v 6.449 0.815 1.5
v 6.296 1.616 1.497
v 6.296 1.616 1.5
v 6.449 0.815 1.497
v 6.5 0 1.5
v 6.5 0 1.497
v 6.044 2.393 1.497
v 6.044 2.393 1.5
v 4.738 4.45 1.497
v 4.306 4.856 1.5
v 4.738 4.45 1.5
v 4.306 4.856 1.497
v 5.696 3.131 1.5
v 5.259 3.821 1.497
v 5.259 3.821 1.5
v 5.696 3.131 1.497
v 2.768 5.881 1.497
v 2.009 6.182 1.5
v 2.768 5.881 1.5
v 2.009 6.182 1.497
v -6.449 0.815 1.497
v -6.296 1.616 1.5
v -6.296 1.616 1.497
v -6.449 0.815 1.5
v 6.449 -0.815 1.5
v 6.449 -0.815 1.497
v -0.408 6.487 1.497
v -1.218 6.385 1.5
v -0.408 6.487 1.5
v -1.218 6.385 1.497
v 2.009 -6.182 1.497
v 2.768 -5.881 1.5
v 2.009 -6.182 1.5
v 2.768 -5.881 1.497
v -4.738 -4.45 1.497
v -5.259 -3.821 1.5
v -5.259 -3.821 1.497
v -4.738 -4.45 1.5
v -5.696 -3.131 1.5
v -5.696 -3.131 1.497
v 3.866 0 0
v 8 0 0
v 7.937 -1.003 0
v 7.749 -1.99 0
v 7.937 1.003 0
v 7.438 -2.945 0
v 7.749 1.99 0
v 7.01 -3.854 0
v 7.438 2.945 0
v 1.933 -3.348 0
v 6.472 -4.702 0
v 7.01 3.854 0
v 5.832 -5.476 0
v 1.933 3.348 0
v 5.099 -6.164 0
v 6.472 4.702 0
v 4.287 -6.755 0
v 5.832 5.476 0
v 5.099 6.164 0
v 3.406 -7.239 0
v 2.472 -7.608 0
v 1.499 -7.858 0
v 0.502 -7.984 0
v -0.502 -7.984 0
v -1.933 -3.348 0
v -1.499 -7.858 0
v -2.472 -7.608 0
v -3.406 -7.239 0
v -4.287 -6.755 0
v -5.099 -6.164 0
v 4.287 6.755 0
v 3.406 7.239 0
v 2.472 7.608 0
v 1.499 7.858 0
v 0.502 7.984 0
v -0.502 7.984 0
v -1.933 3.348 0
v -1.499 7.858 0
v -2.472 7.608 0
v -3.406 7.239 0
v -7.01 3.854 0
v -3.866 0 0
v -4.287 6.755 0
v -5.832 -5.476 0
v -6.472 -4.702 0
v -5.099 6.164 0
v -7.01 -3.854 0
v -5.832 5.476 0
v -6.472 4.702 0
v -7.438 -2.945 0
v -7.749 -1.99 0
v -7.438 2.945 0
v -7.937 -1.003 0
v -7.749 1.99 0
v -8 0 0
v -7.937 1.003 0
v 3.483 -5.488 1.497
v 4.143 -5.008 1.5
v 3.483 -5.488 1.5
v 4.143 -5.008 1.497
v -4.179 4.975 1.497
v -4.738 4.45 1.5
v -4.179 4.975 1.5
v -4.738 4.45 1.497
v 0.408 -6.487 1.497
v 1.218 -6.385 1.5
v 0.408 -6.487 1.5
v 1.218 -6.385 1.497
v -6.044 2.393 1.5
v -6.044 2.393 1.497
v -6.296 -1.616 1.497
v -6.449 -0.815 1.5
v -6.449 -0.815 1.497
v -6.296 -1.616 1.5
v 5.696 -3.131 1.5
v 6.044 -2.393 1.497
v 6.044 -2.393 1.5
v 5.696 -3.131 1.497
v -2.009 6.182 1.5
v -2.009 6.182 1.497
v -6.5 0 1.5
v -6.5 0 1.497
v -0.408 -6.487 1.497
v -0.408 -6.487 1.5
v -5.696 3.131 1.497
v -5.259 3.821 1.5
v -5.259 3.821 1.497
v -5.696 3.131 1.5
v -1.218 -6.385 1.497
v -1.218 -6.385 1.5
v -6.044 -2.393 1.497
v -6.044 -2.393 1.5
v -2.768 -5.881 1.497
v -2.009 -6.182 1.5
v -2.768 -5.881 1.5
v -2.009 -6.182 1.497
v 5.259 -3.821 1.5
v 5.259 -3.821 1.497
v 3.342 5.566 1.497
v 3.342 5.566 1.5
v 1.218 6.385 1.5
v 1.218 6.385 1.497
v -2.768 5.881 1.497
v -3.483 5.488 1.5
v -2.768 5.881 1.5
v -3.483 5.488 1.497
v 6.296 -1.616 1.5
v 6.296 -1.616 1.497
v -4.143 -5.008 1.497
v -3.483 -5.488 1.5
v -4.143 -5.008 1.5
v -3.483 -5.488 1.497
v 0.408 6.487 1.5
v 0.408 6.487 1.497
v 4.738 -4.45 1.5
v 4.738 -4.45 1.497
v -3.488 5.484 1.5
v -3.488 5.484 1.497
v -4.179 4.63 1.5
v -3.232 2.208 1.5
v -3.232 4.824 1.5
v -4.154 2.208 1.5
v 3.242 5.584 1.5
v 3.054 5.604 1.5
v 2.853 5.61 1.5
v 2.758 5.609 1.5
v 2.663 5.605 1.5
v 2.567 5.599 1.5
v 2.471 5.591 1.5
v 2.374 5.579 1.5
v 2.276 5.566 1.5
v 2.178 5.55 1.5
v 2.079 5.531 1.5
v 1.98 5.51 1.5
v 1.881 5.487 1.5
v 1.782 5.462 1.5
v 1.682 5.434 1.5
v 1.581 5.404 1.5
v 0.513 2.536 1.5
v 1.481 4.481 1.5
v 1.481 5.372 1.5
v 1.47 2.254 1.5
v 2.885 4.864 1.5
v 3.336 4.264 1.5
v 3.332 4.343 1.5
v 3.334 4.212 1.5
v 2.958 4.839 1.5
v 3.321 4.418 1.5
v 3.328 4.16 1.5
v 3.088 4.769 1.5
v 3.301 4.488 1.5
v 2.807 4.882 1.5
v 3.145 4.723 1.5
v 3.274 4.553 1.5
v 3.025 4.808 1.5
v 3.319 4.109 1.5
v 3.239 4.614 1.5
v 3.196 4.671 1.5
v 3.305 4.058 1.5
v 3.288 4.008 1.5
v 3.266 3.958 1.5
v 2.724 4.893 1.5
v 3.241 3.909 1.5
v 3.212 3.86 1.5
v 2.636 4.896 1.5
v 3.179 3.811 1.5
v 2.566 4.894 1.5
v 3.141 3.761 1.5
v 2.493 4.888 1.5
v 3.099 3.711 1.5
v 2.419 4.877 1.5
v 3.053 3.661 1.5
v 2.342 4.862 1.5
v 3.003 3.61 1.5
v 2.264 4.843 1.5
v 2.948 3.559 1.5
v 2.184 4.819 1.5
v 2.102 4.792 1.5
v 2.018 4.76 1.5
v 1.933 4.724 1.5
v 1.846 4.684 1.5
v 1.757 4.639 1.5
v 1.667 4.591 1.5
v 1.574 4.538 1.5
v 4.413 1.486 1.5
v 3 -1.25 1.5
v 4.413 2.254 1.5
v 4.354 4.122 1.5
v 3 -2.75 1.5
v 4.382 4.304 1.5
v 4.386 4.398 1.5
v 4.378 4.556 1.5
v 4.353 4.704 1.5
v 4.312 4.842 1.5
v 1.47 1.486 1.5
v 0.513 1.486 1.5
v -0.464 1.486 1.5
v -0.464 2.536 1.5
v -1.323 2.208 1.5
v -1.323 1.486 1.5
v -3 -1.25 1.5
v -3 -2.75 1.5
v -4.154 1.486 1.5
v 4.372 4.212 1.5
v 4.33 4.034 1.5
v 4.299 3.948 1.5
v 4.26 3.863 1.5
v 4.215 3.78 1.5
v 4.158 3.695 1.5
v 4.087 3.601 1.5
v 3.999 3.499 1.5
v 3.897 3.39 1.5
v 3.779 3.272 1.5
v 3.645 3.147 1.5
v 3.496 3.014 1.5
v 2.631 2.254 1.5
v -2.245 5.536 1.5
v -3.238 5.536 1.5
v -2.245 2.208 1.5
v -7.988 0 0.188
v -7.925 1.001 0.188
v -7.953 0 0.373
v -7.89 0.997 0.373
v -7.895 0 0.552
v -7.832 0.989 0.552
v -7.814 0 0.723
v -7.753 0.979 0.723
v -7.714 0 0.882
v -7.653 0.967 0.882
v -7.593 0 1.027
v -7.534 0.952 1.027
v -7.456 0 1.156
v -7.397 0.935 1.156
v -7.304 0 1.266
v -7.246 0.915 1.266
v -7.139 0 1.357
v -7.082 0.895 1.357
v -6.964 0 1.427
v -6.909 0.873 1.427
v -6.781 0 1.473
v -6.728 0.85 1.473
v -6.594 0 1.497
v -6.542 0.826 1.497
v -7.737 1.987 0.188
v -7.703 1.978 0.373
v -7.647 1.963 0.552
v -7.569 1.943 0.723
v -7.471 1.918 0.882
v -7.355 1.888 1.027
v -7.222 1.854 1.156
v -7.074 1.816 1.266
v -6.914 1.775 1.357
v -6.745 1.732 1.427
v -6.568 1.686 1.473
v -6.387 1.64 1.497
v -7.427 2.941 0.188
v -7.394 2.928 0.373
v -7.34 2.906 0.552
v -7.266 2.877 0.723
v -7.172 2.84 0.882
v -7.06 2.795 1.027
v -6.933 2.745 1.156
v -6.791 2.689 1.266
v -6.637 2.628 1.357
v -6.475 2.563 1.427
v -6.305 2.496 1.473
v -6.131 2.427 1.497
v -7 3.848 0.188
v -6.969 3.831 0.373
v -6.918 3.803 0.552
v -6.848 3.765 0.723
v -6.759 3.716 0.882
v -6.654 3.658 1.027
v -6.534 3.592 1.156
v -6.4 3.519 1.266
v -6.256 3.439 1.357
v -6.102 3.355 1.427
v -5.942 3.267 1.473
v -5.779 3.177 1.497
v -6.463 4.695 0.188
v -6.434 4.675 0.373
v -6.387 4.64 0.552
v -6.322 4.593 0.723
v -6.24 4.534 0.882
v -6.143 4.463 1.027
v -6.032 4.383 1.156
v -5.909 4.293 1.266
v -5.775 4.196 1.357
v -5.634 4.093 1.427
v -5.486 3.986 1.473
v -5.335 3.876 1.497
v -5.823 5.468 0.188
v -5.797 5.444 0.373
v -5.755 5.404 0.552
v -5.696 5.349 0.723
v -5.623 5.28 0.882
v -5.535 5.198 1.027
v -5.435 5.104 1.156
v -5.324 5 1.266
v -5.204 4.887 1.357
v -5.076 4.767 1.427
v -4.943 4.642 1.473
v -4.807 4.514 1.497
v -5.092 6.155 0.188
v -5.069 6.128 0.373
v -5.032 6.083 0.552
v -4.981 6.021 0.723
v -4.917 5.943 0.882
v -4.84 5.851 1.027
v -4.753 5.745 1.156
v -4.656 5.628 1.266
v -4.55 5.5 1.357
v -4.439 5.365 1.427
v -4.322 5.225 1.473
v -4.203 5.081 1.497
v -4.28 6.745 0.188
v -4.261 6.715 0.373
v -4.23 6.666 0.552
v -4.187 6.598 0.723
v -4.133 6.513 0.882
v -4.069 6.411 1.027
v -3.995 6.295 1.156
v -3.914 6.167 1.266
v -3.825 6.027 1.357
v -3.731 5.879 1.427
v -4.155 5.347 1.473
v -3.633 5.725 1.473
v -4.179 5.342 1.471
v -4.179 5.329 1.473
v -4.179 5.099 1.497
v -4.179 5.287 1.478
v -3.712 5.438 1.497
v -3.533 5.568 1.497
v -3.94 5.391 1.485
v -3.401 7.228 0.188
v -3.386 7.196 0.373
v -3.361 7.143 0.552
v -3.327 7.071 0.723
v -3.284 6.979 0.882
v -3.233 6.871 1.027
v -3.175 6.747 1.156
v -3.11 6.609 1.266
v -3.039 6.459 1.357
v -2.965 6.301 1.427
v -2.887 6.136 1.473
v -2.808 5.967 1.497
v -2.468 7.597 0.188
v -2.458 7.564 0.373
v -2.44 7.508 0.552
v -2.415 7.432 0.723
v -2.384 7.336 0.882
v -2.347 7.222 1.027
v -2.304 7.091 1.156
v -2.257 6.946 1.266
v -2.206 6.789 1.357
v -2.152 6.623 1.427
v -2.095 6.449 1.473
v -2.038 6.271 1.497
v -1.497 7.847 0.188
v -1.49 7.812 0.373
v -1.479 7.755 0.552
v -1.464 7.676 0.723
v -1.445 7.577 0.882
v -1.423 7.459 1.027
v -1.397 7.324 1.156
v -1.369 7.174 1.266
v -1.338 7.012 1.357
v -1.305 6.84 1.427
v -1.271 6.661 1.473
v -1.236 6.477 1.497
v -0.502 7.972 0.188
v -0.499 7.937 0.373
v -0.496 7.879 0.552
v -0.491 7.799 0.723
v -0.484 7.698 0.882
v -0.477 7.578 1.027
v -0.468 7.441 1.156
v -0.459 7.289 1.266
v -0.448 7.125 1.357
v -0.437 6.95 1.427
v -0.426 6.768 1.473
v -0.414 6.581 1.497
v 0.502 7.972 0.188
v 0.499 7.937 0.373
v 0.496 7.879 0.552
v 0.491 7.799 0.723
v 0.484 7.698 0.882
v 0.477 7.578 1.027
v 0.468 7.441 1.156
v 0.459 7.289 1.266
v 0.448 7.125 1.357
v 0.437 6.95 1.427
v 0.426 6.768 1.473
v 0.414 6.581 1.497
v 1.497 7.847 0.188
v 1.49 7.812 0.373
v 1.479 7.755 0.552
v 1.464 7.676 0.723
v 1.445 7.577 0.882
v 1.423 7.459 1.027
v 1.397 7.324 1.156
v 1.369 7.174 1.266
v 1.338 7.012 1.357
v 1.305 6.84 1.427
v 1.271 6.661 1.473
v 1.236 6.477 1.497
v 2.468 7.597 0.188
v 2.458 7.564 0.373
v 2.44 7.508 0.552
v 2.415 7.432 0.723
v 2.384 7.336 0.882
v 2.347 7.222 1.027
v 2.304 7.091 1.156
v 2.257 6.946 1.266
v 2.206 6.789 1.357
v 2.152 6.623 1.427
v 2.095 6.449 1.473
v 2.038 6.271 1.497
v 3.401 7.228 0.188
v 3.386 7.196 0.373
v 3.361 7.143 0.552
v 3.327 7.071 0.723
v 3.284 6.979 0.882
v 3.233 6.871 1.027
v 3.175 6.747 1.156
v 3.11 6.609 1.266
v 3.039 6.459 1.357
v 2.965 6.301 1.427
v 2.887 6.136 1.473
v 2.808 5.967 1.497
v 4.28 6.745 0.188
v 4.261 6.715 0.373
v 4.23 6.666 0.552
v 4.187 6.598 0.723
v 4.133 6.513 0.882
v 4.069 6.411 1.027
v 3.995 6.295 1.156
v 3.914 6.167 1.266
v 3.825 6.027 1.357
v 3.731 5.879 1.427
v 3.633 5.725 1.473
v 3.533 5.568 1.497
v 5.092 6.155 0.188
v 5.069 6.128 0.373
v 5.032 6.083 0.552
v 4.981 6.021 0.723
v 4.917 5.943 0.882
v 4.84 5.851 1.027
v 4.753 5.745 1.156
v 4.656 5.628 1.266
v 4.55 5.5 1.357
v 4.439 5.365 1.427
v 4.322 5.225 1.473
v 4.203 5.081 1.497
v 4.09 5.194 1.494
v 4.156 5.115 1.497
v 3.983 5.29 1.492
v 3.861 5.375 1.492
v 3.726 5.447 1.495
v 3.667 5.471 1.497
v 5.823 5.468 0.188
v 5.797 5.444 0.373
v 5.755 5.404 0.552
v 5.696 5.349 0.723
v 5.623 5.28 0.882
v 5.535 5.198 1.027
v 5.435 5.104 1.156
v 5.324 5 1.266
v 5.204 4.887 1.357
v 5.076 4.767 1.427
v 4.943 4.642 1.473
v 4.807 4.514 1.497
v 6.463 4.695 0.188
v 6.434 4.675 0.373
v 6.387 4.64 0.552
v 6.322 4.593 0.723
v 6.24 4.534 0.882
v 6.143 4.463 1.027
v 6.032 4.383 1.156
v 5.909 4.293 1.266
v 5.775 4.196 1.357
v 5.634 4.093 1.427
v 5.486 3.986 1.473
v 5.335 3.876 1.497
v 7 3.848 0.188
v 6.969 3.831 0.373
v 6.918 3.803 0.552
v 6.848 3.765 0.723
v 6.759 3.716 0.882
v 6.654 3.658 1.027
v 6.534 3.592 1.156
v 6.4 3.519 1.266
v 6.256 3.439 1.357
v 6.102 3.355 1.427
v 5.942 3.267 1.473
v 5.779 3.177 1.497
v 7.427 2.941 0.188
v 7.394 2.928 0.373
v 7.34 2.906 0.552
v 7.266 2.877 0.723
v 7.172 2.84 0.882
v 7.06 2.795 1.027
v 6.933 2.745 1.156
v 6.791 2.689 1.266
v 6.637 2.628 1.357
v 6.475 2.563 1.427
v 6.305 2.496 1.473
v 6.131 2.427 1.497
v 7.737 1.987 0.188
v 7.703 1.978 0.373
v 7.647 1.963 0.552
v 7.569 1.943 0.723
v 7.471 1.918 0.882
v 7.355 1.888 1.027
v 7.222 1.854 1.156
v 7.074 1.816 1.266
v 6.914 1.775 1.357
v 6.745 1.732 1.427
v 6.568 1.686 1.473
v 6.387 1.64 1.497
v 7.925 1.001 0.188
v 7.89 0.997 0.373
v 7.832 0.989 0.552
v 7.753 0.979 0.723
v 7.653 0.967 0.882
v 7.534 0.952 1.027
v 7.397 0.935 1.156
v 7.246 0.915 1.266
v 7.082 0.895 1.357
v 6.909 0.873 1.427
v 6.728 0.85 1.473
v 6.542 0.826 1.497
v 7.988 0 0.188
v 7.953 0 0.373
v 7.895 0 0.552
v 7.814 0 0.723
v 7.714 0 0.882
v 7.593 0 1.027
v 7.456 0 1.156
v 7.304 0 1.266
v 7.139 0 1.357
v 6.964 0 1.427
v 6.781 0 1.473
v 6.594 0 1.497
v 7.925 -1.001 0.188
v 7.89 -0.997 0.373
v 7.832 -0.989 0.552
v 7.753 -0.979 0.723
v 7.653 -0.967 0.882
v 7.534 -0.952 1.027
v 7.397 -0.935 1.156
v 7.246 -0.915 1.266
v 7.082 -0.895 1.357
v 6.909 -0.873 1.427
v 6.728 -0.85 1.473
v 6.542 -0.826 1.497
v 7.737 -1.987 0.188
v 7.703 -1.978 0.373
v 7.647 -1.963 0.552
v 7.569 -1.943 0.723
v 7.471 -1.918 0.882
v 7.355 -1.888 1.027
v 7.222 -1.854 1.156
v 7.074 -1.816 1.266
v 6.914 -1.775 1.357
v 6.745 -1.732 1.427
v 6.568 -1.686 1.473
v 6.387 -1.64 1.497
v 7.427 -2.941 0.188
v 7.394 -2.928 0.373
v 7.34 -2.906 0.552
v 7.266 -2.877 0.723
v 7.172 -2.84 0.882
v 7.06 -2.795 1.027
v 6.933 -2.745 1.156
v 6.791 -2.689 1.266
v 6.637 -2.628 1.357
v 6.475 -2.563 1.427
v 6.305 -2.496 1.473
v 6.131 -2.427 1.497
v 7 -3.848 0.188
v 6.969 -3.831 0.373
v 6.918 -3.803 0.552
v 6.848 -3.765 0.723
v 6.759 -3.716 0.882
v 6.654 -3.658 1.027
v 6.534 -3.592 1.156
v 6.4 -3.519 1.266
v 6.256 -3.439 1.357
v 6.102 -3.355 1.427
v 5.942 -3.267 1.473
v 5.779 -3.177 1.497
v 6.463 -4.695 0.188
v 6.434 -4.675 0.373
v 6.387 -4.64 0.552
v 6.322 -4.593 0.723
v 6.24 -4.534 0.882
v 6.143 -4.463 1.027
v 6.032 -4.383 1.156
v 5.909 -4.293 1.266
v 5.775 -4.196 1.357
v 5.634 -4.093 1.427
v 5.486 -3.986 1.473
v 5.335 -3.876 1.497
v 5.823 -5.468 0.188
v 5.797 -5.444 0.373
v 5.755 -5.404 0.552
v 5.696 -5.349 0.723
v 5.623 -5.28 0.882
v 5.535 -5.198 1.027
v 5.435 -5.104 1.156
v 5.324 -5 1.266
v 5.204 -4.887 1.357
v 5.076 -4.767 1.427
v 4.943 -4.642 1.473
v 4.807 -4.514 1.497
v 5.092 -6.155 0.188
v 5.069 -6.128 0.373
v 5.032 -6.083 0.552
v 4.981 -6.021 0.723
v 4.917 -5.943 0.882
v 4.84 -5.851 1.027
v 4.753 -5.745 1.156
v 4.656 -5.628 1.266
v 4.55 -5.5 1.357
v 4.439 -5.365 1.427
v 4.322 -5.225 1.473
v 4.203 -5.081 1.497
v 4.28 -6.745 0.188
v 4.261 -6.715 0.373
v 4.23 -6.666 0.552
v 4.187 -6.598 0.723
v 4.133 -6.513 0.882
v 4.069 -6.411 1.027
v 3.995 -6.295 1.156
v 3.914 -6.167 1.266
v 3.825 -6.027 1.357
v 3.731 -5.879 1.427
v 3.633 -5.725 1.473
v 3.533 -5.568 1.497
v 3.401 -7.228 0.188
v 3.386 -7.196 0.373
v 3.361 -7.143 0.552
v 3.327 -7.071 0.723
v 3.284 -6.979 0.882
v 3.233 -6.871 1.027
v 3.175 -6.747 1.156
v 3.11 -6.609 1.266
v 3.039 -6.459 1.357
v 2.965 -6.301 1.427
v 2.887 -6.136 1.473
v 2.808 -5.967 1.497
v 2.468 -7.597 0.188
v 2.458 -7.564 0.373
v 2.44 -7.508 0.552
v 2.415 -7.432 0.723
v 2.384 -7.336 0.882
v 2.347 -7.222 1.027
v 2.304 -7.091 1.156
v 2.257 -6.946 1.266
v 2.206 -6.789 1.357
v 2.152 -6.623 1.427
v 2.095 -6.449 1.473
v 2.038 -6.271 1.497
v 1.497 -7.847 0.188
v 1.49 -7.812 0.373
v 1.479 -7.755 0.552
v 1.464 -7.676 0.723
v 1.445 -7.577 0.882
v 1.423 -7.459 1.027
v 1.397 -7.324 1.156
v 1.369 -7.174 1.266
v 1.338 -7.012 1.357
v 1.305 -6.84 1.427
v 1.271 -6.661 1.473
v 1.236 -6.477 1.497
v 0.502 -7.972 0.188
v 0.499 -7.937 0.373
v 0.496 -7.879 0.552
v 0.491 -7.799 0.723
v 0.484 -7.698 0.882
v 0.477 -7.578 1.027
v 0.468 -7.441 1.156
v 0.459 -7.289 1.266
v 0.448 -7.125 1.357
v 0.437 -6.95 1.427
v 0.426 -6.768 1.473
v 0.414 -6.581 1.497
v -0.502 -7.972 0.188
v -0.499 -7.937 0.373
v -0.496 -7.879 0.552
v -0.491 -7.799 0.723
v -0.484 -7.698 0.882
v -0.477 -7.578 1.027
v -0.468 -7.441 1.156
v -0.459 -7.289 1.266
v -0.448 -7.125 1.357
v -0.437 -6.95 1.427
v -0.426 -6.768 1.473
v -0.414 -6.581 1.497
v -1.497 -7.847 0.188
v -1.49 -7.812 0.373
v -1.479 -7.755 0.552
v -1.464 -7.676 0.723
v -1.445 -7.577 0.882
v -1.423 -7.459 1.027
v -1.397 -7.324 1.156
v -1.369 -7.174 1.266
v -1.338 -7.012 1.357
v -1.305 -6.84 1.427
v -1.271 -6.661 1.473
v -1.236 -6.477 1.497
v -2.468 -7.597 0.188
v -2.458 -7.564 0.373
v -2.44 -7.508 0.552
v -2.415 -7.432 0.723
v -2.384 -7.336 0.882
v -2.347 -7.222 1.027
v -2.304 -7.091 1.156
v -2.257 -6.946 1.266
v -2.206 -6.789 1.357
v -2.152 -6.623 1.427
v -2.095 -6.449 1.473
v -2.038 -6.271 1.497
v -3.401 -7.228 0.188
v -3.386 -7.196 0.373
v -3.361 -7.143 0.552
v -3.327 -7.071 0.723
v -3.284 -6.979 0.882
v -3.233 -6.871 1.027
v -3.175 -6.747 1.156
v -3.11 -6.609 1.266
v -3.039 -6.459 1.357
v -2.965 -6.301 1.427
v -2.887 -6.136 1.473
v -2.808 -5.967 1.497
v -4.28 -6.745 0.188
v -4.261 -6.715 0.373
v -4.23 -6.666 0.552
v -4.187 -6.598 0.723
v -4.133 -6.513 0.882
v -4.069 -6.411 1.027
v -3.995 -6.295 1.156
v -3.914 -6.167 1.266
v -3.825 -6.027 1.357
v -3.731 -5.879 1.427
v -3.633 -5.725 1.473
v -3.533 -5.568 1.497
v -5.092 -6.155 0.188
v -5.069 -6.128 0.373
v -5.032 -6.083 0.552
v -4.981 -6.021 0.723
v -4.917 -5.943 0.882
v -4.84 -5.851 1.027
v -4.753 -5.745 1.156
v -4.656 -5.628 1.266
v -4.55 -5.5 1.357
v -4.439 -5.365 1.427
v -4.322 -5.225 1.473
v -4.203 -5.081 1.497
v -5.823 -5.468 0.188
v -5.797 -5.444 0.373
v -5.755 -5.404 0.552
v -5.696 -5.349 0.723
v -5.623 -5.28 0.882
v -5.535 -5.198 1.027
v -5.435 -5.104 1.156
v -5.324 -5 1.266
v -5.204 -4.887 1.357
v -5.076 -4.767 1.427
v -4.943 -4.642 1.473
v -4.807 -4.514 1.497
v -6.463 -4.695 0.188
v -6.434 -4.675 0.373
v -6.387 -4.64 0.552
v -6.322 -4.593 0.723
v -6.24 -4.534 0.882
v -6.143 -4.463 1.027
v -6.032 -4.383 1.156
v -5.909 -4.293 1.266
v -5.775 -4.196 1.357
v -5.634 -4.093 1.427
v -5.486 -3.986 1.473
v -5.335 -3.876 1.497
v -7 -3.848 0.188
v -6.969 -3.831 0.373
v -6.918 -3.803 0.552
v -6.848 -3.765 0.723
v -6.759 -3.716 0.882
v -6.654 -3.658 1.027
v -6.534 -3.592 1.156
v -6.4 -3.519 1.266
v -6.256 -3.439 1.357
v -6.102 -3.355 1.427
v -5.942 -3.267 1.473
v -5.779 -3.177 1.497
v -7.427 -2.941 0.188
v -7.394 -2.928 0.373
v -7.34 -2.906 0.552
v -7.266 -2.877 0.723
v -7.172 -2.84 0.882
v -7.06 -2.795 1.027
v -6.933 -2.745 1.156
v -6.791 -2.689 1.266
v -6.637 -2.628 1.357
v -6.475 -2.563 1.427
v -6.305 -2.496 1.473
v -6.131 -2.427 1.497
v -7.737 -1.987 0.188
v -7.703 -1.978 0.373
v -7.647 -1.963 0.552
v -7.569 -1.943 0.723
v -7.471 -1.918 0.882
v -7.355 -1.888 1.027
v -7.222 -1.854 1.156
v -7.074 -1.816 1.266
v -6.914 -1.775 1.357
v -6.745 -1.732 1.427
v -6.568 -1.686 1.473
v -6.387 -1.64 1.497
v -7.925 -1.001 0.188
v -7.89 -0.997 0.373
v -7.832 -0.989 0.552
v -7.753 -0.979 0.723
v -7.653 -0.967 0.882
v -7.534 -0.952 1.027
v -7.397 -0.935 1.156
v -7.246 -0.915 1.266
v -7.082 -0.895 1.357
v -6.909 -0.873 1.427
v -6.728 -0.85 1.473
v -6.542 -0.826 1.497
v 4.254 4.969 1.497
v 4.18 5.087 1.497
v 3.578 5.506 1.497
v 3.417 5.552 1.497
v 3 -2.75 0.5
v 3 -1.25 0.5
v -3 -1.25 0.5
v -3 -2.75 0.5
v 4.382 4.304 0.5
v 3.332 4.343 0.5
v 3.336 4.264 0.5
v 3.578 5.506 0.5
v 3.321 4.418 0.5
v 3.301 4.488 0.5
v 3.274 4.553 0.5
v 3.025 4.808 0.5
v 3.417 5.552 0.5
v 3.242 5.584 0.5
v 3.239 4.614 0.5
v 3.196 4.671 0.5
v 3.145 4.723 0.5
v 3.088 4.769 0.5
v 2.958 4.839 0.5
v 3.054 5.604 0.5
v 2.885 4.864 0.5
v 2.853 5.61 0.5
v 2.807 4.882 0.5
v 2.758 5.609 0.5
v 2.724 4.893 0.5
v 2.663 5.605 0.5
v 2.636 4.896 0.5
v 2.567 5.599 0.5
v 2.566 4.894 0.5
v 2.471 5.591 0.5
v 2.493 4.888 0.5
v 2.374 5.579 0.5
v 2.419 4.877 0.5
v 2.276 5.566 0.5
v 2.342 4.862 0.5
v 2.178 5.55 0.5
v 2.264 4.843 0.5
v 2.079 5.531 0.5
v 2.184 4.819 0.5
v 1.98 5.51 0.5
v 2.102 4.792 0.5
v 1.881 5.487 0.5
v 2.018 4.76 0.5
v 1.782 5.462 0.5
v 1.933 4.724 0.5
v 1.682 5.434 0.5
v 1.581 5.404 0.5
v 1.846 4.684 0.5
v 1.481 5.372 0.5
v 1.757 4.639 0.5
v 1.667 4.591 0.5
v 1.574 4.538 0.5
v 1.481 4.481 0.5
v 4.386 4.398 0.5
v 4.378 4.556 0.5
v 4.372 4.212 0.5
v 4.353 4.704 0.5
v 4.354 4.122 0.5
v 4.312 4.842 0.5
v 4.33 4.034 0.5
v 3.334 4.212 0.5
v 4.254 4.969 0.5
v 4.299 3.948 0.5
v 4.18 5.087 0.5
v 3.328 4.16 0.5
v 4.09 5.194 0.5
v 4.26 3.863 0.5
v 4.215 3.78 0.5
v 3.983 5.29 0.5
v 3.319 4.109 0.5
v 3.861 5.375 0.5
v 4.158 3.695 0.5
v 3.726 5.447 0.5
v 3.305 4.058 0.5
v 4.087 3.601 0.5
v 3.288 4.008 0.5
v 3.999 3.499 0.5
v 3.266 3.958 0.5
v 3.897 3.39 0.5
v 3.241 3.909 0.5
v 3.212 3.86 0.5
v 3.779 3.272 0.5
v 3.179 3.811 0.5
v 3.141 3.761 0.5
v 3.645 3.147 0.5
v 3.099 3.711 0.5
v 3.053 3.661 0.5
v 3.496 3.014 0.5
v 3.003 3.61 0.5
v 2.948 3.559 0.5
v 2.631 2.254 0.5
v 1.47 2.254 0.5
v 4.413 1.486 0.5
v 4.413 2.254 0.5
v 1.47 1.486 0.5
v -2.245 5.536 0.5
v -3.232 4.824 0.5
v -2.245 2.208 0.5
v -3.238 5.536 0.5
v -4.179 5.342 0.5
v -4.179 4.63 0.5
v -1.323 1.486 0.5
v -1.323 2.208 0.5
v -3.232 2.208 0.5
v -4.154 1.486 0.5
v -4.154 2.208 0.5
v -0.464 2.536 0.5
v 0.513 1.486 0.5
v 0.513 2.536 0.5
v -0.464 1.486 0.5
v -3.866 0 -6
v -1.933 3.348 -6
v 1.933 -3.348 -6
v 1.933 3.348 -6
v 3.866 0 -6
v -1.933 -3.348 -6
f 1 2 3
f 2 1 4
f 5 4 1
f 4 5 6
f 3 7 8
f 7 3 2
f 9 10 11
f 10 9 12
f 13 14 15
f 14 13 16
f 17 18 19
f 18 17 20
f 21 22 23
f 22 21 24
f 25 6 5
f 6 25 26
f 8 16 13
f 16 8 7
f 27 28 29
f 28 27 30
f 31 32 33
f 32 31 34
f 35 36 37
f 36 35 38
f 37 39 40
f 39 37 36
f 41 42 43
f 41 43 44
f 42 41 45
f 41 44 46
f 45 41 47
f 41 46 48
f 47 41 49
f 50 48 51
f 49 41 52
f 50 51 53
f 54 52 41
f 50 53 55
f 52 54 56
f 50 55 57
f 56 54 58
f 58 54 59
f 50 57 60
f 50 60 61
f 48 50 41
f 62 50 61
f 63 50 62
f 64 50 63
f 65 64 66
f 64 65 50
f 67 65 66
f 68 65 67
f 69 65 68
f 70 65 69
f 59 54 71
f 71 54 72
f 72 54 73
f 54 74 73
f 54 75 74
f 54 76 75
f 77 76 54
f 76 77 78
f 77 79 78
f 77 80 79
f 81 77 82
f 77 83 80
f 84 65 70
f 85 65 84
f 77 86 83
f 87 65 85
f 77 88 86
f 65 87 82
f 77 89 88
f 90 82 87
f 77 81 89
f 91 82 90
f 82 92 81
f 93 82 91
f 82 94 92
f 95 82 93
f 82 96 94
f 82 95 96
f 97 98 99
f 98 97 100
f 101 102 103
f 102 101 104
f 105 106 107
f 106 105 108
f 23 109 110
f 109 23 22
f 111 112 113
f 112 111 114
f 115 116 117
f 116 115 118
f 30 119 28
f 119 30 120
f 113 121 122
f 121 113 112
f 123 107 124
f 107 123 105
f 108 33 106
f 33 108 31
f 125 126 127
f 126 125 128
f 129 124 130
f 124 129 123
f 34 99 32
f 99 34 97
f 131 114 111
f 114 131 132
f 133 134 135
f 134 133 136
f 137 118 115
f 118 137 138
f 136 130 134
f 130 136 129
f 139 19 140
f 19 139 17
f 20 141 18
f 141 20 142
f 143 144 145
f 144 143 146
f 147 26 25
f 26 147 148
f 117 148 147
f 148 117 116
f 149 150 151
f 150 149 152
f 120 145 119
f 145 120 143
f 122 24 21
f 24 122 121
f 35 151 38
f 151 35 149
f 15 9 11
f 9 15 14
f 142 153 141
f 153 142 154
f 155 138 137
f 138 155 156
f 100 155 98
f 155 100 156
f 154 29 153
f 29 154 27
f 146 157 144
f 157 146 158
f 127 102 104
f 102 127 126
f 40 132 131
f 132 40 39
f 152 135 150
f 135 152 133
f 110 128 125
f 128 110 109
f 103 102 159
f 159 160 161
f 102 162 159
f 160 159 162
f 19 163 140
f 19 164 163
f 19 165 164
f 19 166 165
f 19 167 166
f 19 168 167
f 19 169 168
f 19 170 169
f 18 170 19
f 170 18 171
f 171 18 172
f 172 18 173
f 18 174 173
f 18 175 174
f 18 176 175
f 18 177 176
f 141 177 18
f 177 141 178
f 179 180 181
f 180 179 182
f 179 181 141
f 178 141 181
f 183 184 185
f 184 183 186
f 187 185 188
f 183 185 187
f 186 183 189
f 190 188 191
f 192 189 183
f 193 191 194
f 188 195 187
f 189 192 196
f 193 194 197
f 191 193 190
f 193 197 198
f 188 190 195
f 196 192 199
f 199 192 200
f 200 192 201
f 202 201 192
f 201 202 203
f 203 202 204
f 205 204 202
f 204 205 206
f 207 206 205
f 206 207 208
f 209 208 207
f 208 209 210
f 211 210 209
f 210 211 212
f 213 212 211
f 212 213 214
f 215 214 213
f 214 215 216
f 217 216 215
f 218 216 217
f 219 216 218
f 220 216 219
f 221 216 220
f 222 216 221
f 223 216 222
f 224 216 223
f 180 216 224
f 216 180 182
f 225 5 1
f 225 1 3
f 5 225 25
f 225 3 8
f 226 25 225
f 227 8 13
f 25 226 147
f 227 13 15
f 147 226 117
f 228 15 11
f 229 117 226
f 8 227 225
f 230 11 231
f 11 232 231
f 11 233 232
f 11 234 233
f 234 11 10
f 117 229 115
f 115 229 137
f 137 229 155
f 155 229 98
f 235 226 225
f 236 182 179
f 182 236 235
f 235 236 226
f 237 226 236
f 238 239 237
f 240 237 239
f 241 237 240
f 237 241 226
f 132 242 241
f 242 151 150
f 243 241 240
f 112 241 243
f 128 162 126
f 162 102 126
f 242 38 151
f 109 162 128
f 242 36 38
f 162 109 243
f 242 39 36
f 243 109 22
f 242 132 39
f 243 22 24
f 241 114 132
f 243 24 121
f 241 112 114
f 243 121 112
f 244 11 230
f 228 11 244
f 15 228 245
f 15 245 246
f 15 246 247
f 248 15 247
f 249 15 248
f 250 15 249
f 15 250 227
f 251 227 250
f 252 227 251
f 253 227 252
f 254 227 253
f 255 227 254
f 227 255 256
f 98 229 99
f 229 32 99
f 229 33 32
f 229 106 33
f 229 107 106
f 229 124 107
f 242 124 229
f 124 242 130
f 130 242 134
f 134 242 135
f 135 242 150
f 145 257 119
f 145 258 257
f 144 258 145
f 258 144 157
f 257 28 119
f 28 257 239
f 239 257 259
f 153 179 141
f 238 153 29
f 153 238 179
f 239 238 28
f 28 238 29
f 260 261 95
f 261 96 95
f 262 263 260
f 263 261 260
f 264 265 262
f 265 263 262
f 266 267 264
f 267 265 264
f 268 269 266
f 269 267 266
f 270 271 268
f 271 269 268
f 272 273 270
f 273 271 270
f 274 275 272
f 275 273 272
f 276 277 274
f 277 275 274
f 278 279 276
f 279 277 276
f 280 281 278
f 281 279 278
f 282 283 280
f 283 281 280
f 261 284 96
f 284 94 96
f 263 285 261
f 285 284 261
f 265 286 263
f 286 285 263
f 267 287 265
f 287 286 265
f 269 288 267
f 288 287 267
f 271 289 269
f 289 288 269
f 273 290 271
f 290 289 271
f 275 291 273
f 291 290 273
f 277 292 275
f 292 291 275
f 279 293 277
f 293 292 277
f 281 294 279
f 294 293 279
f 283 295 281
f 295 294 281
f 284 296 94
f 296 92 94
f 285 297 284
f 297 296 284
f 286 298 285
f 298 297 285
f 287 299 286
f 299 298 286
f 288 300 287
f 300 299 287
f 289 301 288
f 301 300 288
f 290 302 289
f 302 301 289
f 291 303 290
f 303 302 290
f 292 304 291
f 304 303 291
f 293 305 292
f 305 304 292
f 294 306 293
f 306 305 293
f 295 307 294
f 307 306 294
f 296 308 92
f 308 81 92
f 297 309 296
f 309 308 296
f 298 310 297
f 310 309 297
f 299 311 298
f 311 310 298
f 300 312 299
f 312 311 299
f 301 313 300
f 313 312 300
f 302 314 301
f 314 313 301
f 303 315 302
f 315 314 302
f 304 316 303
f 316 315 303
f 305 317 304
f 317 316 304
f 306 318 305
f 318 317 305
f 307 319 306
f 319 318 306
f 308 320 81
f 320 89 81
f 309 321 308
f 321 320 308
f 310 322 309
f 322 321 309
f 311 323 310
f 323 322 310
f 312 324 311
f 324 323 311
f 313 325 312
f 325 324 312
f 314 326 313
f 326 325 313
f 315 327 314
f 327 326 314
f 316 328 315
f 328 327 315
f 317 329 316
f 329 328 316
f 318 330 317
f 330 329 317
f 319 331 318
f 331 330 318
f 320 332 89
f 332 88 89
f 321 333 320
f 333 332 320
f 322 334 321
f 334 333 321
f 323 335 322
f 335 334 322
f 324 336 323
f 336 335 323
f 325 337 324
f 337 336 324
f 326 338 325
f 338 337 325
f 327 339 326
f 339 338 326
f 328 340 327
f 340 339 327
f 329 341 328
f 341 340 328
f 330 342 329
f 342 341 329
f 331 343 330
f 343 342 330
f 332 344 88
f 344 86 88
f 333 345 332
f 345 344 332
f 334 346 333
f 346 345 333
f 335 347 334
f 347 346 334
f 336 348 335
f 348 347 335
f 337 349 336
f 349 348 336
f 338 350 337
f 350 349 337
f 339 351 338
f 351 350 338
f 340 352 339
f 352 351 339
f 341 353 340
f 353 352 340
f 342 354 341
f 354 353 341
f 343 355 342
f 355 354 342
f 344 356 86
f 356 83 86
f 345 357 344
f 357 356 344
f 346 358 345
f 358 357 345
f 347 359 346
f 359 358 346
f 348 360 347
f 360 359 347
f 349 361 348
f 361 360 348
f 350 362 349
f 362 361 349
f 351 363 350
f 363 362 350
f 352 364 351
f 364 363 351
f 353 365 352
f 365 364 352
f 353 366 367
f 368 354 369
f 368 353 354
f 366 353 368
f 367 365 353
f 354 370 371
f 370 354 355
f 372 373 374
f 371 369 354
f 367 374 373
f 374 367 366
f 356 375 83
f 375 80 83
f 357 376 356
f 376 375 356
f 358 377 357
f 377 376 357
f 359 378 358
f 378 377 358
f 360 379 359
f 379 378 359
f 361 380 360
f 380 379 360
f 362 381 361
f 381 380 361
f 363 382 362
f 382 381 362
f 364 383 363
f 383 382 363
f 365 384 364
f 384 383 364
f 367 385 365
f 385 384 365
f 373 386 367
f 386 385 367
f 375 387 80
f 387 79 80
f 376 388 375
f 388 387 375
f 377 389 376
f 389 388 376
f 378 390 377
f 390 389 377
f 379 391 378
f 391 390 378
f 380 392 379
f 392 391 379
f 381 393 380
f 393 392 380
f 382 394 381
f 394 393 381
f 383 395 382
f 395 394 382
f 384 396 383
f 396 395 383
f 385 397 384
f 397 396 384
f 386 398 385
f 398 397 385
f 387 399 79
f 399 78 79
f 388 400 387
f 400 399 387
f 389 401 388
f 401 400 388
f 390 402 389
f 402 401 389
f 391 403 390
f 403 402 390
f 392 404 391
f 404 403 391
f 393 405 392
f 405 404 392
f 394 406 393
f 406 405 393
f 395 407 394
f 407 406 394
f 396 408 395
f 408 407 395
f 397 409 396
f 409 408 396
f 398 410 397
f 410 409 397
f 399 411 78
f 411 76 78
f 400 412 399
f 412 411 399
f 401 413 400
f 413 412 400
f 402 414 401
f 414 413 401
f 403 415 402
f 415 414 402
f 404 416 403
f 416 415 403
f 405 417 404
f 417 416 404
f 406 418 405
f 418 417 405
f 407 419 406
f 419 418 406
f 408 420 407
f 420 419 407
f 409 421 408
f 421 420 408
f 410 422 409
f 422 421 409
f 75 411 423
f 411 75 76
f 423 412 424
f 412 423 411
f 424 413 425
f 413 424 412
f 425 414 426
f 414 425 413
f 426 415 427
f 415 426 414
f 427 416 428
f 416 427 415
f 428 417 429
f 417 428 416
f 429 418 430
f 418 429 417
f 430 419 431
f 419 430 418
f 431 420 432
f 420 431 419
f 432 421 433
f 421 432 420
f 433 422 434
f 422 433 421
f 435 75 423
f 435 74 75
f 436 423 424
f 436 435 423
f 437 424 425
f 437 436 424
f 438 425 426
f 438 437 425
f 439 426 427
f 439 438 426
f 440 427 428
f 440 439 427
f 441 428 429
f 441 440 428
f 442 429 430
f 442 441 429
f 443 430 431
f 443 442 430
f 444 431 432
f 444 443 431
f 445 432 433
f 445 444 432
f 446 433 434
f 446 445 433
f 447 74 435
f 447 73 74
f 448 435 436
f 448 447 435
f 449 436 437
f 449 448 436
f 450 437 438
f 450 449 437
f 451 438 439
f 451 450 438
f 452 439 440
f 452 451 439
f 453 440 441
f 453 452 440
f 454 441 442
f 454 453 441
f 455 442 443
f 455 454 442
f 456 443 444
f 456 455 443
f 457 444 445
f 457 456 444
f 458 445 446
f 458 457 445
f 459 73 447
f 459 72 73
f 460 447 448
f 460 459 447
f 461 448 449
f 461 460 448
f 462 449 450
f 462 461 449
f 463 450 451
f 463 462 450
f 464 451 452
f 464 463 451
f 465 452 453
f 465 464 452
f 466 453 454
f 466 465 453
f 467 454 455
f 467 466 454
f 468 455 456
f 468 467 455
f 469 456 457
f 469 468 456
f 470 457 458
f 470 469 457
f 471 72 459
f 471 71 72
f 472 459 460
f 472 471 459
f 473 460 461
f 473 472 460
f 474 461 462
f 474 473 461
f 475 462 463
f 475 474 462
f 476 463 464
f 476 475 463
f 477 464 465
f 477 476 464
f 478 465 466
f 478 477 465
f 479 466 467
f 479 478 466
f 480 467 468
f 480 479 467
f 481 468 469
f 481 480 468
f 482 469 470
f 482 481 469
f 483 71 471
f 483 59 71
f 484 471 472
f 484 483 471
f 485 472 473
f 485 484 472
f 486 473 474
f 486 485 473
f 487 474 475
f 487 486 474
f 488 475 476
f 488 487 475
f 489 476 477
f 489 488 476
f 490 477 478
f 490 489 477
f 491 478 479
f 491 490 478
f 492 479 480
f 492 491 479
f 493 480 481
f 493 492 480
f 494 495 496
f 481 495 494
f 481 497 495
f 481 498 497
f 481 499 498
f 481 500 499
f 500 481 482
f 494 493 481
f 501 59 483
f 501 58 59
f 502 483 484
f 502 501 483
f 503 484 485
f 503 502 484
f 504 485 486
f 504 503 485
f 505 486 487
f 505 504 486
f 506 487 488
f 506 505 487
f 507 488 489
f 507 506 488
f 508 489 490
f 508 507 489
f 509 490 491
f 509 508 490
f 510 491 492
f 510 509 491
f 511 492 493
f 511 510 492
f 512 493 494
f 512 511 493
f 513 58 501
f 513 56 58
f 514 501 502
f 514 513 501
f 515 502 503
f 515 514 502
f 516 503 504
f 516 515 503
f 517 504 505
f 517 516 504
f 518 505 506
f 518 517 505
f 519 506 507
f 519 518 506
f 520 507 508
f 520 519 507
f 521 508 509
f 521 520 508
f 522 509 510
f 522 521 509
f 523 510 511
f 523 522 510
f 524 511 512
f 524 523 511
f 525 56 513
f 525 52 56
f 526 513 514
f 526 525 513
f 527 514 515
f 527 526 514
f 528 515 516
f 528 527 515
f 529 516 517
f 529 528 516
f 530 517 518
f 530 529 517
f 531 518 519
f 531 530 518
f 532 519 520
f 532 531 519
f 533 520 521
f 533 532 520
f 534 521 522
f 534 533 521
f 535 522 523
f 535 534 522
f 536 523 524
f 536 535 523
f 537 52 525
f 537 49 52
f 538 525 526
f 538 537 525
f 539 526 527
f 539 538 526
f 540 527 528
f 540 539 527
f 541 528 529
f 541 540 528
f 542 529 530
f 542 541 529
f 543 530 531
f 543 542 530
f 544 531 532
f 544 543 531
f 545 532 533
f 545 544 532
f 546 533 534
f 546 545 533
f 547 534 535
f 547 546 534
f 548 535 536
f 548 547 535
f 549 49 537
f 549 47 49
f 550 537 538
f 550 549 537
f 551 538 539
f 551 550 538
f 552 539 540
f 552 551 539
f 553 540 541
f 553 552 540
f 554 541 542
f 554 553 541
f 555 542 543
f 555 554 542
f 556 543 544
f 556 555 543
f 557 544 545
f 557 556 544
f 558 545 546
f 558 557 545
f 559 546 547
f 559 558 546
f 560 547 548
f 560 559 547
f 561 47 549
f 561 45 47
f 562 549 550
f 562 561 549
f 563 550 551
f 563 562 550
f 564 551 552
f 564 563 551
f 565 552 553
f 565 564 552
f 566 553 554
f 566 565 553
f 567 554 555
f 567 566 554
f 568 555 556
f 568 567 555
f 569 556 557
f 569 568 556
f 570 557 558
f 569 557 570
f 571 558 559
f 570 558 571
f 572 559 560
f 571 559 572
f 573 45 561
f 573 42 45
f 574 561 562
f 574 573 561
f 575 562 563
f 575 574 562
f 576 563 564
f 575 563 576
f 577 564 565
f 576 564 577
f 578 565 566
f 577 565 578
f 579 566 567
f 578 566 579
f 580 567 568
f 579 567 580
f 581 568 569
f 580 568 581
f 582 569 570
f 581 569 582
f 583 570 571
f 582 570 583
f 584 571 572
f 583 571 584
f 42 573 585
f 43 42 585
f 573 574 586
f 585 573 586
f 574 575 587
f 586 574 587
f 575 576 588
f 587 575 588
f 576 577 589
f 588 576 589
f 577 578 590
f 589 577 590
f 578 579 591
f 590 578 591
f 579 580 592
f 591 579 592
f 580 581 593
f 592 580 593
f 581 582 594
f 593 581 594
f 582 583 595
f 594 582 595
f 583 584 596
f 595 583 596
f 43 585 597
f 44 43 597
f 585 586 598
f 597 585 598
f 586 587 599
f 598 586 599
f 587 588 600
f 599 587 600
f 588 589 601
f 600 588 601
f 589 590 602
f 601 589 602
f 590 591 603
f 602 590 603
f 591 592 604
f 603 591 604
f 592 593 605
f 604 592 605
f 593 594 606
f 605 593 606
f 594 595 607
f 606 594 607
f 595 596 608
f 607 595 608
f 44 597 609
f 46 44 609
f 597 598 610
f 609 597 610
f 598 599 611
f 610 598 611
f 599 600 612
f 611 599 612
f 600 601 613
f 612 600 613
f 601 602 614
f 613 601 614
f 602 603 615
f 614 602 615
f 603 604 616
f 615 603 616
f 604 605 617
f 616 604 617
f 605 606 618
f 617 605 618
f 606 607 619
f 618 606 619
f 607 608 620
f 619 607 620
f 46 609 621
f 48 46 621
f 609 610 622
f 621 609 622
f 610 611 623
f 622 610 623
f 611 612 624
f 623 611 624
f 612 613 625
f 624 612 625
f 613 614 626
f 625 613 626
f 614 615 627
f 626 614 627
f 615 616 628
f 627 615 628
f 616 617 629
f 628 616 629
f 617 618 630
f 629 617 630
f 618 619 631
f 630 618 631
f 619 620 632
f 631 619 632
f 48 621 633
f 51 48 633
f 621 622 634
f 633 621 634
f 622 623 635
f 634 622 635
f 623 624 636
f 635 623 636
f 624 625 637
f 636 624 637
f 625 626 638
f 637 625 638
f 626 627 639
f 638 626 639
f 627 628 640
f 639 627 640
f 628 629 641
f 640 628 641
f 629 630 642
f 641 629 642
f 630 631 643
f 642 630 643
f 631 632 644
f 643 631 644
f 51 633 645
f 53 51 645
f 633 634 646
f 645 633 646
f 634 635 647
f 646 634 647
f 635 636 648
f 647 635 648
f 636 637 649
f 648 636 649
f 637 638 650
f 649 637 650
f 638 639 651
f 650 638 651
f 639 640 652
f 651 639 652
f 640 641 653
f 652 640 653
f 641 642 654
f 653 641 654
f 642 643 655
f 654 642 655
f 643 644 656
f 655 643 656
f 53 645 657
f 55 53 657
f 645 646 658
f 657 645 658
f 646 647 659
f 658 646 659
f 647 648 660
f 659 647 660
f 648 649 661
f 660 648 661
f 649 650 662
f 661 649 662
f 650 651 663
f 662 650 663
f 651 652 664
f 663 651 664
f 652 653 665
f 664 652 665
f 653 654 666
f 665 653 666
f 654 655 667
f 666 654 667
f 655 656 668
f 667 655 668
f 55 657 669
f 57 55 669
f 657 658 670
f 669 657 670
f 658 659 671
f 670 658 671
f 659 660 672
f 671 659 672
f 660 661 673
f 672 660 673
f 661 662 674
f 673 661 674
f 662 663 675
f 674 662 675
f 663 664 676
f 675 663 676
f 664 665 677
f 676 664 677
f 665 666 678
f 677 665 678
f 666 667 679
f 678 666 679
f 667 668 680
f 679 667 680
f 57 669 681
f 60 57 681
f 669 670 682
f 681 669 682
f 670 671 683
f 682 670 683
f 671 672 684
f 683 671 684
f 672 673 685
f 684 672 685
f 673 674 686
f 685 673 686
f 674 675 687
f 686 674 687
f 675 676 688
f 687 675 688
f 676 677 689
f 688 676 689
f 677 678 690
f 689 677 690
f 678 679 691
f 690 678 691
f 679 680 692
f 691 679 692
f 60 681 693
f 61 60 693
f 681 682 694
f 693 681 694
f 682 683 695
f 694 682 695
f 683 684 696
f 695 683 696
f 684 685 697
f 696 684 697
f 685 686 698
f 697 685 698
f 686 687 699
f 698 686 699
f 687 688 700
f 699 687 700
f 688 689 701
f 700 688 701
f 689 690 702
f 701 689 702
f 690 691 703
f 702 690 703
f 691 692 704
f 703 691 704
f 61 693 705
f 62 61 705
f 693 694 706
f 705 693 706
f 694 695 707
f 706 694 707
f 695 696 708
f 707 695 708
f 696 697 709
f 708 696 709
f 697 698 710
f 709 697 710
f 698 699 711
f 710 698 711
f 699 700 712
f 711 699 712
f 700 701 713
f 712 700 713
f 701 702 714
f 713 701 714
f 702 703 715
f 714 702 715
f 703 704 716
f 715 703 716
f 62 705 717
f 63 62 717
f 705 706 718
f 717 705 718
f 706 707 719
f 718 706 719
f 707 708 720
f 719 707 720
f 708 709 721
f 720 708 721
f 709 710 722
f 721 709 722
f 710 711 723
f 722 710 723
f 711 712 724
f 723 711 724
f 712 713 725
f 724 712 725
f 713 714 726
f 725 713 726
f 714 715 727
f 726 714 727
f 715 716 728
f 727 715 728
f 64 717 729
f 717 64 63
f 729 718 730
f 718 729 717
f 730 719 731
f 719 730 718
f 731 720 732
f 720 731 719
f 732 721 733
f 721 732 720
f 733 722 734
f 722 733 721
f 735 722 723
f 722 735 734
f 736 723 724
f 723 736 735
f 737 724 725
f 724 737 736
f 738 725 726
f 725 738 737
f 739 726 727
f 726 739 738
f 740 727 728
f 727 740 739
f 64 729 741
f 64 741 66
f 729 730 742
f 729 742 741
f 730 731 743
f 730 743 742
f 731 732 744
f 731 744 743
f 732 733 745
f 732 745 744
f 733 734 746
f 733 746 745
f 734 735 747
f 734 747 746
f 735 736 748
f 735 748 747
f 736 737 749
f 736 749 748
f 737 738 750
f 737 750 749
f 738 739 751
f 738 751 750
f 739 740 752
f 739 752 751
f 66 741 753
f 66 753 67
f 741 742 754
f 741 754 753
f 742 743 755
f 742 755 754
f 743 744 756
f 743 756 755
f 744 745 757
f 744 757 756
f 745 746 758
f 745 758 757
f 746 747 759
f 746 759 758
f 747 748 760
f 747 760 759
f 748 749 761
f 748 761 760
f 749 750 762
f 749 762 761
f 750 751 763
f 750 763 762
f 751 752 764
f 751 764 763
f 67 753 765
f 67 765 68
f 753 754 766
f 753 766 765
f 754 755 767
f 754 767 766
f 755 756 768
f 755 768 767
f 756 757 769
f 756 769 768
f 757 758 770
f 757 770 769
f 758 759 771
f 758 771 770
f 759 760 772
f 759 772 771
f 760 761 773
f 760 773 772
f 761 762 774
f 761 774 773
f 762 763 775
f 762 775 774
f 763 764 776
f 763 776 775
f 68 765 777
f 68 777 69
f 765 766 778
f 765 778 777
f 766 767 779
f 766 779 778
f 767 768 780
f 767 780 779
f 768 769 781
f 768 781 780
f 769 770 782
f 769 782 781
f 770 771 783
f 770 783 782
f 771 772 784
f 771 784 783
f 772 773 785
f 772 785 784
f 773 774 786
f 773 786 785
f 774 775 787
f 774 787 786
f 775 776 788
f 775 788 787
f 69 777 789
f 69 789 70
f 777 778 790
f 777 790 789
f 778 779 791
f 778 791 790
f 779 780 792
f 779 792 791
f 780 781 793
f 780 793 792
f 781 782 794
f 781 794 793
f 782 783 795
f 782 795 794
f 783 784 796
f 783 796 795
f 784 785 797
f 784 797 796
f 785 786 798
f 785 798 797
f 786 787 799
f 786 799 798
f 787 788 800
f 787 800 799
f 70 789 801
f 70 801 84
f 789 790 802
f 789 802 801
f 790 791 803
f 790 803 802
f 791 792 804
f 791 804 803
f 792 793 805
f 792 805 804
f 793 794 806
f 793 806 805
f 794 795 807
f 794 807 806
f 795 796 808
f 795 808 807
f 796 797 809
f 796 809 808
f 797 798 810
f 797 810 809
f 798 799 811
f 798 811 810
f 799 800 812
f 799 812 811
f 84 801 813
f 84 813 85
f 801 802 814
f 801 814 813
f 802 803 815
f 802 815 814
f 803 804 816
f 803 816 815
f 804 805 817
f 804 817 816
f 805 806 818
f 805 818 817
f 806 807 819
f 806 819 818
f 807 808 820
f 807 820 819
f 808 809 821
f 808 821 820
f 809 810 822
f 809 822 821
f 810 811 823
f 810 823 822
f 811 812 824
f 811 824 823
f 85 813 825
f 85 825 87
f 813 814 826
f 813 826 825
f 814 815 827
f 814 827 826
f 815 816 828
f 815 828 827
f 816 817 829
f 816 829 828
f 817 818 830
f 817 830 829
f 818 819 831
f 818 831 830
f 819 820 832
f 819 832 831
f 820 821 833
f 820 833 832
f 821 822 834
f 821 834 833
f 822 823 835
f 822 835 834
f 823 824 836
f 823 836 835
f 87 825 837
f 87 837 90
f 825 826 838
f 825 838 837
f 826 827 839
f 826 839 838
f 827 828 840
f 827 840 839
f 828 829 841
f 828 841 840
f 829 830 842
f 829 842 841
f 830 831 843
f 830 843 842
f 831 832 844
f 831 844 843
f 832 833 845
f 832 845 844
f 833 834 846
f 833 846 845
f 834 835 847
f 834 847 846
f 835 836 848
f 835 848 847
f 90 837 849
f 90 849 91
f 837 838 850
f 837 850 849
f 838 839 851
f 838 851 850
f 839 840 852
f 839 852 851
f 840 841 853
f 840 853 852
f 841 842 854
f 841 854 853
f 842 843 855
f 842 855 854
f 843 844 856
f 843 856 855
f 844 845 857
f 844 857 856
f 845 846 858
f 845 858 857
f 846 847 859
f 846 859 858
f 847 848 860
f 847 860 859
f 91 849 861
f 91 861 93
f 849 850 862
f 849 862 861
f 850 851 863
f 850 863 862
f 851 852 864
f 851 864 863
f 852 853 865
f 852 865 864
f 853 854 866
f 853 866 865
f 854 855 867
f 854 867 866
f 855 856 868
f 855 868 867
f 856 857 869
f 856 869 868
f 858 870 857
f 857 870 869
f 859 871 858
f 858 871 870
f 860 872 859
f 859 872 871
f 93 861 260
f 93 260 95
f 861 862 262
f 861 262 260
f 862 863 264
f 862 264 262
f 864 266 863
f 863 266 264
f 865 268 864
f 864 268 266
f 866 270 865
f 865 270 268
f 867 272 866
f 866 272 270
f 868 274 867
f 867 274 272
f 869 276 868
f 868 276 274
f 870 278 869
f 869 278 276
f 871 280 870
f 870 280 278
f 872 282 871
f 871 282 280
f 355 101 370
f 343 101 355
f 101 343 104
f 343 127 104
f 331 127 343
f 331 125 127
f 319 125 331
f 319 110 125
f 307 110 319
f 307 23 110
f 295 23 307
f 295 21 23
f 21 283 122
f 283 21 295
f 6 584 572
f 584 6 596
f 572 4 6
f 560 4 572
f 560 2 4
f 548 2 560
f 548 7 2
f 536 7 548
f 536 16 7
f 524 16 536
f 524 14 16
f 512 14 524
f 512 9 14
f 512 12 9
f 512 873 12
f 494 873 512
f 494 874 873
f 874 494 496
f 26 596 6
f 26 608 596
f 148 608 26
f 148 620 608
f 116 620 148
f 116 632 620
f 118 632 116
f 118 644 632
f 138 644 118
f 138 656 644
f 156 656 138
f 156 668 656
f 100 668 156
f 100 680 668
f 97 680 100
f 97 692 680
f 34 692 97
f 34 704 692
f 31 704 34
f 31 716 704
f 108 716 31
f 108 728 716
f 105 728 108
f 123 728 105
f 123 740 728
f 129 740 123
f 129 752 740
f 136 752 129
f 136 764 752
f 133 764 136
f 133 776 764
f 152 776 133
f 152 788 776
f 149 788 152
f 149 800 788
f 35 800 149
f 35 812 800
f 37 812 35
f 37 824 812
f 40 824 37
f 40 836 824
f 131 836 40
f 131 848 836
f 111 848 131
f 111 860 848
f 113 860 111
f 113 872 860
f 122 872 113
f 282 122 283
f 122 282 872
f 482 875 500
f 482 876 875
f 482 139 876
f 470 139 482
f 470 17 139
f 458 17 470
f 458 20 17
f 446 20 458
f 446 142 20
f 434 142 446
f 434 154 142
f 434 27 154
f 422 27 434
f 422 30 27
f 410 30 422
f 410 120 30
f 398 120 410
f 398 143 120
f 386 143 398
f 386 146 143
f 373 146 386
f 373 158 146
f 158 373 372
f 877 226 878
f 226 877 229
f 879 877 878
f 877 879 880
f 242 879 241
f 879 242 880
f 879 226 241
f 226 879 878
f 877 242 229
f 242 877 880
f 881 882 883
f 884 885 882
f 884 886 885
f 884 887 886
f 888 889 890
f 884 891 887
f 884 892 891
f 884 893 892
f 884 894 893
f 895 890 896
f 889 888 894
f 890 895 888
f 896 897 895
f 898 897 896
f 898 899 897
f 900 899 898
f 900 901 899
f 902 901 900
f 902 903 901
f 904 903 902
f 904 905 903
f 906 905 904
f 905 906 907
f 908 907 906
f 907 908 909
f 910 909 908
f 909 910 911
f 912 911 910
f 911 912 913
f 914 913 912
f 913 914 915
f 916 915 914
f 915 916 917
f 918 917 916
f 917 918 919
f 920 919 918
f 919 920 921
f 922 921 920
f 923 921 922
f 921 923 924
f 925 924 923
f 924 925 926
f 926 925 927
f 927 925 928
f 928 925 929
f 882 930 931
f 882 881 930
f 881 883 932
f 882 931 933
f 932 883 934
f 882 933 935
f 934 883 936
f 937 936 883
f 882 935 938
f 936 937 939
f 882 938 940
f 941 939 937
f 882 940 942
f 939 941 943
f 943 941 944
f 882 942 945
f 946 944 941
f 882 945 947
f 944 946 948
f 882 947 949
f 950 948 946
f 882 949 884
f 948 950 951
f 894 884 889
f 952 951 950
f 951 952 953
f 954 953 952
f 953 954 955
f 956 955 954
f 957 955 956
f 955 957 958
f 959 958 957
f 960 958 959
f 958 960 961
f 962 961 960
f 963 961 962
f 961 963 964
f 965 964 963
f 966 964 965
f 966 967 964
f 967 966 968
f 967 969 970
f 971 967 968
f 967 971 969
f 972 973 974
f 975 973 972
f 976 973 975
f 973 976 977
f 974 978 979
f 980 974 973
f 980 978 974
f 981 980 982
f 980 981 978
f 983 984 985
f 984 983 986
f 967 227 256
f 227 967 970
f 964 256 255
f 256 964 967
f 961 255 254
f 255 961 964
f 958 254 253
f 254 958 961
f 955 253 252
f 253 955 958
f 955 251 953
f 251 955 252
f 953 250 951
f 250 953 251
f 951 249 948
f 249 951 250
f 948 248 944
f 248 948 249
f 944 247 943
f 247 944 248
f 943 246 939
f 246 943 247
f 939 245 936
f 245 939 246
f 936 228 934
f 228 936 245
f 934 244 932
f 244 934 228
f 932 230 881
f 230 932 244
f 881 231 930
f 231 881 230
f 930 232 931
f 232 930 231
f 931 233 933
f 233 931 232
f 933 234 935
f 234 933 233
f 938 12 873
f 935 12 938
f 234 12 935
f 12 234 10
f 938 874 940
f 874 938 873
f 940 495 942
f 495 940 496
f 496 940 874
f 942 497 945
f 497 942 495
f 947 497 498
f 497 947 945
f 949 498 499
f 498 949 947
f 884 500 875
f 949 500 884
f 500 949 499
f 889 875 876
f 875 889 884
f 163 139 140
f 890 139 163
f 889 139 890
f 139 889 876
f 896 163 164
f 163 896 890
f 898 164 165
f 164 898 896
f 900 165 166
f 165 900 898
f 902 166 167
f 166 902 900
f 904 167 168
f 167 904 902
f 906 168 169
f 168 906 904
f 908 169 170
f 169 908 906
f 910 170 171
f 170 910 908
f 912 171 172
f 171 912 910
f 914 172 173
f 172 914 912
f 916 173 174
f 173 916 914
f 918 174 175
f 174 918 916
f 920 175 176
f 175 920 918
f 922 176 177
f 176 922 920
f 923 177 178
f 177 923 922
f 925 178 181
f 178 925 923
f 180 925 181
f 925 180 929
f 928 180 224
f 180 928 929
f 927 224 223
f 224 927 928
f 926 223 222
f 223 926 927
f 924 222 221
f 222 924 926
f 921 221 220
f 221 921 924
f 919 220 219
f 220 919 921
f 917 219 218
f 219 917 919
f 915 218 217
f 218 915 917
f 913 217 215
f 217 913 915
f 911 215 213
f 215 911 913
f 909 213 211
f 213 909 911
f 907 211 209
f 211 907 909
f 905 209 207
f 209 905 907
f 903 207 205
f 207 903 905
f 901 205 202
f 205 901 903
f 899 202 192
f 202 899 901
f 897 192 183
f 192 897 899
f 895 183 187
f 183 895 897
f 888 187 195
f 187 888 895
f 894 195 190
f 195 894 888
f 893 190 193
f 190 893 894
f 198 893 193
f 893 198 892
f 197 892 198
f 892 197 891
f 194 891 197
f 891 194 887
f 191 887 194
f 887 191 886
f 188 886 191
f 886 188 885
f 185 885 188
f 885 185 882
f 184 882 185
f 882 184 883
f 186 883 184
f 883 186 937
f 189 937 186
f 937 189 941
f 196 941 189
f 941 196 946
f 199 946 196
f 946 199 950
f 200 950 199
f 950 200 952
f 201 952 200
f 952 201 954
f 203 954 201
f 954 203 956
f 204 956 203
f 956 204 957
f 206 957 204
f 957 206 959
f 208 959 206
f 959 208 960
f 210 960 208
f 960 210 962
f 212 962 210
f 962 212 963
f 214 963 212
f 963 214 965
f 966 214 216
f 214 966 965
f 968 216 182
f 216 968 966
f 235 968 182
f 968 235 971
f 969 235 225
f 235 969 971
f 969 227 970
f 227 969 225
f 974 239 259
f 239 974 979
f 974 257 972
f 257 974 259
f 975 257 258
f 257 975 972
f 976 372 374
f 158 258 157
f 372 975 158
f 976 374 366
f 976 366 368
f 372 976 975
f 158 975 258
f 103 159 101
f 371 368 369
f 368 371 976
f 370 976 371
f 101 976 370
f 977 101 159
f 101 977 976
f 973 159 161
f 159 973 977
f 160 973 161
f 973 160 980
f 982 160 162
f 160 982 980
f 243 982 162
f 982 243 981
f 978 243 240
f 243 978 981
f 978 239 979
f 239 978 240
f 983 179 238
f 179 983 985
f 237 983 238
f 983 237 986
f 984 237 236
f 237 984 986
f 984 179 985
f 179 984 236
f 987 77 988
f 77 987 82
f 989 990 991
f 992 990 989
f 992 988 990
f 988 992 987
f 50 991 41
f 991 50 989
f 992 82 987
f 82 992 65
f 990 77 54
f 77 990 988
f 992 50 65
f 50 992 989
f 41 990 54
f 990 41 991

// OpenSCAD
$fn = 50;


union() {
	difference() {
		union() {
			cylinder(h = 1.5000000000, r = 6.5000000000);
			rotate_extrude(angle = 360) {
				translate(v = [6.5000000000, 0, 0]) {
					circle(r = 1.5000000000);
				}
			}
		}
		union() {
			translate(v = [-25.0000000000, -25.0000000000, -50]) {
				cube(size = [50, 50, 50]);
			}
			#translate(v = [-3.0000000000, -2.7500000000, 0.5000000000]) {
				cube(size = [6, 1.5000000000, 1]);
			}
			#translate(v = [0, 3.5000000000, 0.5000000000]) {
				linear_extrude(height = 1) {
					text(font = "SegoiUI:Bold", halign = "center", size = 4, text = "1.2", valign = "center");
				}
			}
		}
	}
	union() {
		translate(v = [0, 0, -6]) {
			linear_extrude(height = 6) {
				polygon(points = [[3.8658550000, 0.0000000000], [1.9329275000, 3.3479286373], [-1.9329275000, 3.3479286373], [-3.8658550000, 0.0000000000], [-1.9329275000, -3.3479286373], [1.9329275000, -3.3479286373]]);
			}
		}
	}
}
